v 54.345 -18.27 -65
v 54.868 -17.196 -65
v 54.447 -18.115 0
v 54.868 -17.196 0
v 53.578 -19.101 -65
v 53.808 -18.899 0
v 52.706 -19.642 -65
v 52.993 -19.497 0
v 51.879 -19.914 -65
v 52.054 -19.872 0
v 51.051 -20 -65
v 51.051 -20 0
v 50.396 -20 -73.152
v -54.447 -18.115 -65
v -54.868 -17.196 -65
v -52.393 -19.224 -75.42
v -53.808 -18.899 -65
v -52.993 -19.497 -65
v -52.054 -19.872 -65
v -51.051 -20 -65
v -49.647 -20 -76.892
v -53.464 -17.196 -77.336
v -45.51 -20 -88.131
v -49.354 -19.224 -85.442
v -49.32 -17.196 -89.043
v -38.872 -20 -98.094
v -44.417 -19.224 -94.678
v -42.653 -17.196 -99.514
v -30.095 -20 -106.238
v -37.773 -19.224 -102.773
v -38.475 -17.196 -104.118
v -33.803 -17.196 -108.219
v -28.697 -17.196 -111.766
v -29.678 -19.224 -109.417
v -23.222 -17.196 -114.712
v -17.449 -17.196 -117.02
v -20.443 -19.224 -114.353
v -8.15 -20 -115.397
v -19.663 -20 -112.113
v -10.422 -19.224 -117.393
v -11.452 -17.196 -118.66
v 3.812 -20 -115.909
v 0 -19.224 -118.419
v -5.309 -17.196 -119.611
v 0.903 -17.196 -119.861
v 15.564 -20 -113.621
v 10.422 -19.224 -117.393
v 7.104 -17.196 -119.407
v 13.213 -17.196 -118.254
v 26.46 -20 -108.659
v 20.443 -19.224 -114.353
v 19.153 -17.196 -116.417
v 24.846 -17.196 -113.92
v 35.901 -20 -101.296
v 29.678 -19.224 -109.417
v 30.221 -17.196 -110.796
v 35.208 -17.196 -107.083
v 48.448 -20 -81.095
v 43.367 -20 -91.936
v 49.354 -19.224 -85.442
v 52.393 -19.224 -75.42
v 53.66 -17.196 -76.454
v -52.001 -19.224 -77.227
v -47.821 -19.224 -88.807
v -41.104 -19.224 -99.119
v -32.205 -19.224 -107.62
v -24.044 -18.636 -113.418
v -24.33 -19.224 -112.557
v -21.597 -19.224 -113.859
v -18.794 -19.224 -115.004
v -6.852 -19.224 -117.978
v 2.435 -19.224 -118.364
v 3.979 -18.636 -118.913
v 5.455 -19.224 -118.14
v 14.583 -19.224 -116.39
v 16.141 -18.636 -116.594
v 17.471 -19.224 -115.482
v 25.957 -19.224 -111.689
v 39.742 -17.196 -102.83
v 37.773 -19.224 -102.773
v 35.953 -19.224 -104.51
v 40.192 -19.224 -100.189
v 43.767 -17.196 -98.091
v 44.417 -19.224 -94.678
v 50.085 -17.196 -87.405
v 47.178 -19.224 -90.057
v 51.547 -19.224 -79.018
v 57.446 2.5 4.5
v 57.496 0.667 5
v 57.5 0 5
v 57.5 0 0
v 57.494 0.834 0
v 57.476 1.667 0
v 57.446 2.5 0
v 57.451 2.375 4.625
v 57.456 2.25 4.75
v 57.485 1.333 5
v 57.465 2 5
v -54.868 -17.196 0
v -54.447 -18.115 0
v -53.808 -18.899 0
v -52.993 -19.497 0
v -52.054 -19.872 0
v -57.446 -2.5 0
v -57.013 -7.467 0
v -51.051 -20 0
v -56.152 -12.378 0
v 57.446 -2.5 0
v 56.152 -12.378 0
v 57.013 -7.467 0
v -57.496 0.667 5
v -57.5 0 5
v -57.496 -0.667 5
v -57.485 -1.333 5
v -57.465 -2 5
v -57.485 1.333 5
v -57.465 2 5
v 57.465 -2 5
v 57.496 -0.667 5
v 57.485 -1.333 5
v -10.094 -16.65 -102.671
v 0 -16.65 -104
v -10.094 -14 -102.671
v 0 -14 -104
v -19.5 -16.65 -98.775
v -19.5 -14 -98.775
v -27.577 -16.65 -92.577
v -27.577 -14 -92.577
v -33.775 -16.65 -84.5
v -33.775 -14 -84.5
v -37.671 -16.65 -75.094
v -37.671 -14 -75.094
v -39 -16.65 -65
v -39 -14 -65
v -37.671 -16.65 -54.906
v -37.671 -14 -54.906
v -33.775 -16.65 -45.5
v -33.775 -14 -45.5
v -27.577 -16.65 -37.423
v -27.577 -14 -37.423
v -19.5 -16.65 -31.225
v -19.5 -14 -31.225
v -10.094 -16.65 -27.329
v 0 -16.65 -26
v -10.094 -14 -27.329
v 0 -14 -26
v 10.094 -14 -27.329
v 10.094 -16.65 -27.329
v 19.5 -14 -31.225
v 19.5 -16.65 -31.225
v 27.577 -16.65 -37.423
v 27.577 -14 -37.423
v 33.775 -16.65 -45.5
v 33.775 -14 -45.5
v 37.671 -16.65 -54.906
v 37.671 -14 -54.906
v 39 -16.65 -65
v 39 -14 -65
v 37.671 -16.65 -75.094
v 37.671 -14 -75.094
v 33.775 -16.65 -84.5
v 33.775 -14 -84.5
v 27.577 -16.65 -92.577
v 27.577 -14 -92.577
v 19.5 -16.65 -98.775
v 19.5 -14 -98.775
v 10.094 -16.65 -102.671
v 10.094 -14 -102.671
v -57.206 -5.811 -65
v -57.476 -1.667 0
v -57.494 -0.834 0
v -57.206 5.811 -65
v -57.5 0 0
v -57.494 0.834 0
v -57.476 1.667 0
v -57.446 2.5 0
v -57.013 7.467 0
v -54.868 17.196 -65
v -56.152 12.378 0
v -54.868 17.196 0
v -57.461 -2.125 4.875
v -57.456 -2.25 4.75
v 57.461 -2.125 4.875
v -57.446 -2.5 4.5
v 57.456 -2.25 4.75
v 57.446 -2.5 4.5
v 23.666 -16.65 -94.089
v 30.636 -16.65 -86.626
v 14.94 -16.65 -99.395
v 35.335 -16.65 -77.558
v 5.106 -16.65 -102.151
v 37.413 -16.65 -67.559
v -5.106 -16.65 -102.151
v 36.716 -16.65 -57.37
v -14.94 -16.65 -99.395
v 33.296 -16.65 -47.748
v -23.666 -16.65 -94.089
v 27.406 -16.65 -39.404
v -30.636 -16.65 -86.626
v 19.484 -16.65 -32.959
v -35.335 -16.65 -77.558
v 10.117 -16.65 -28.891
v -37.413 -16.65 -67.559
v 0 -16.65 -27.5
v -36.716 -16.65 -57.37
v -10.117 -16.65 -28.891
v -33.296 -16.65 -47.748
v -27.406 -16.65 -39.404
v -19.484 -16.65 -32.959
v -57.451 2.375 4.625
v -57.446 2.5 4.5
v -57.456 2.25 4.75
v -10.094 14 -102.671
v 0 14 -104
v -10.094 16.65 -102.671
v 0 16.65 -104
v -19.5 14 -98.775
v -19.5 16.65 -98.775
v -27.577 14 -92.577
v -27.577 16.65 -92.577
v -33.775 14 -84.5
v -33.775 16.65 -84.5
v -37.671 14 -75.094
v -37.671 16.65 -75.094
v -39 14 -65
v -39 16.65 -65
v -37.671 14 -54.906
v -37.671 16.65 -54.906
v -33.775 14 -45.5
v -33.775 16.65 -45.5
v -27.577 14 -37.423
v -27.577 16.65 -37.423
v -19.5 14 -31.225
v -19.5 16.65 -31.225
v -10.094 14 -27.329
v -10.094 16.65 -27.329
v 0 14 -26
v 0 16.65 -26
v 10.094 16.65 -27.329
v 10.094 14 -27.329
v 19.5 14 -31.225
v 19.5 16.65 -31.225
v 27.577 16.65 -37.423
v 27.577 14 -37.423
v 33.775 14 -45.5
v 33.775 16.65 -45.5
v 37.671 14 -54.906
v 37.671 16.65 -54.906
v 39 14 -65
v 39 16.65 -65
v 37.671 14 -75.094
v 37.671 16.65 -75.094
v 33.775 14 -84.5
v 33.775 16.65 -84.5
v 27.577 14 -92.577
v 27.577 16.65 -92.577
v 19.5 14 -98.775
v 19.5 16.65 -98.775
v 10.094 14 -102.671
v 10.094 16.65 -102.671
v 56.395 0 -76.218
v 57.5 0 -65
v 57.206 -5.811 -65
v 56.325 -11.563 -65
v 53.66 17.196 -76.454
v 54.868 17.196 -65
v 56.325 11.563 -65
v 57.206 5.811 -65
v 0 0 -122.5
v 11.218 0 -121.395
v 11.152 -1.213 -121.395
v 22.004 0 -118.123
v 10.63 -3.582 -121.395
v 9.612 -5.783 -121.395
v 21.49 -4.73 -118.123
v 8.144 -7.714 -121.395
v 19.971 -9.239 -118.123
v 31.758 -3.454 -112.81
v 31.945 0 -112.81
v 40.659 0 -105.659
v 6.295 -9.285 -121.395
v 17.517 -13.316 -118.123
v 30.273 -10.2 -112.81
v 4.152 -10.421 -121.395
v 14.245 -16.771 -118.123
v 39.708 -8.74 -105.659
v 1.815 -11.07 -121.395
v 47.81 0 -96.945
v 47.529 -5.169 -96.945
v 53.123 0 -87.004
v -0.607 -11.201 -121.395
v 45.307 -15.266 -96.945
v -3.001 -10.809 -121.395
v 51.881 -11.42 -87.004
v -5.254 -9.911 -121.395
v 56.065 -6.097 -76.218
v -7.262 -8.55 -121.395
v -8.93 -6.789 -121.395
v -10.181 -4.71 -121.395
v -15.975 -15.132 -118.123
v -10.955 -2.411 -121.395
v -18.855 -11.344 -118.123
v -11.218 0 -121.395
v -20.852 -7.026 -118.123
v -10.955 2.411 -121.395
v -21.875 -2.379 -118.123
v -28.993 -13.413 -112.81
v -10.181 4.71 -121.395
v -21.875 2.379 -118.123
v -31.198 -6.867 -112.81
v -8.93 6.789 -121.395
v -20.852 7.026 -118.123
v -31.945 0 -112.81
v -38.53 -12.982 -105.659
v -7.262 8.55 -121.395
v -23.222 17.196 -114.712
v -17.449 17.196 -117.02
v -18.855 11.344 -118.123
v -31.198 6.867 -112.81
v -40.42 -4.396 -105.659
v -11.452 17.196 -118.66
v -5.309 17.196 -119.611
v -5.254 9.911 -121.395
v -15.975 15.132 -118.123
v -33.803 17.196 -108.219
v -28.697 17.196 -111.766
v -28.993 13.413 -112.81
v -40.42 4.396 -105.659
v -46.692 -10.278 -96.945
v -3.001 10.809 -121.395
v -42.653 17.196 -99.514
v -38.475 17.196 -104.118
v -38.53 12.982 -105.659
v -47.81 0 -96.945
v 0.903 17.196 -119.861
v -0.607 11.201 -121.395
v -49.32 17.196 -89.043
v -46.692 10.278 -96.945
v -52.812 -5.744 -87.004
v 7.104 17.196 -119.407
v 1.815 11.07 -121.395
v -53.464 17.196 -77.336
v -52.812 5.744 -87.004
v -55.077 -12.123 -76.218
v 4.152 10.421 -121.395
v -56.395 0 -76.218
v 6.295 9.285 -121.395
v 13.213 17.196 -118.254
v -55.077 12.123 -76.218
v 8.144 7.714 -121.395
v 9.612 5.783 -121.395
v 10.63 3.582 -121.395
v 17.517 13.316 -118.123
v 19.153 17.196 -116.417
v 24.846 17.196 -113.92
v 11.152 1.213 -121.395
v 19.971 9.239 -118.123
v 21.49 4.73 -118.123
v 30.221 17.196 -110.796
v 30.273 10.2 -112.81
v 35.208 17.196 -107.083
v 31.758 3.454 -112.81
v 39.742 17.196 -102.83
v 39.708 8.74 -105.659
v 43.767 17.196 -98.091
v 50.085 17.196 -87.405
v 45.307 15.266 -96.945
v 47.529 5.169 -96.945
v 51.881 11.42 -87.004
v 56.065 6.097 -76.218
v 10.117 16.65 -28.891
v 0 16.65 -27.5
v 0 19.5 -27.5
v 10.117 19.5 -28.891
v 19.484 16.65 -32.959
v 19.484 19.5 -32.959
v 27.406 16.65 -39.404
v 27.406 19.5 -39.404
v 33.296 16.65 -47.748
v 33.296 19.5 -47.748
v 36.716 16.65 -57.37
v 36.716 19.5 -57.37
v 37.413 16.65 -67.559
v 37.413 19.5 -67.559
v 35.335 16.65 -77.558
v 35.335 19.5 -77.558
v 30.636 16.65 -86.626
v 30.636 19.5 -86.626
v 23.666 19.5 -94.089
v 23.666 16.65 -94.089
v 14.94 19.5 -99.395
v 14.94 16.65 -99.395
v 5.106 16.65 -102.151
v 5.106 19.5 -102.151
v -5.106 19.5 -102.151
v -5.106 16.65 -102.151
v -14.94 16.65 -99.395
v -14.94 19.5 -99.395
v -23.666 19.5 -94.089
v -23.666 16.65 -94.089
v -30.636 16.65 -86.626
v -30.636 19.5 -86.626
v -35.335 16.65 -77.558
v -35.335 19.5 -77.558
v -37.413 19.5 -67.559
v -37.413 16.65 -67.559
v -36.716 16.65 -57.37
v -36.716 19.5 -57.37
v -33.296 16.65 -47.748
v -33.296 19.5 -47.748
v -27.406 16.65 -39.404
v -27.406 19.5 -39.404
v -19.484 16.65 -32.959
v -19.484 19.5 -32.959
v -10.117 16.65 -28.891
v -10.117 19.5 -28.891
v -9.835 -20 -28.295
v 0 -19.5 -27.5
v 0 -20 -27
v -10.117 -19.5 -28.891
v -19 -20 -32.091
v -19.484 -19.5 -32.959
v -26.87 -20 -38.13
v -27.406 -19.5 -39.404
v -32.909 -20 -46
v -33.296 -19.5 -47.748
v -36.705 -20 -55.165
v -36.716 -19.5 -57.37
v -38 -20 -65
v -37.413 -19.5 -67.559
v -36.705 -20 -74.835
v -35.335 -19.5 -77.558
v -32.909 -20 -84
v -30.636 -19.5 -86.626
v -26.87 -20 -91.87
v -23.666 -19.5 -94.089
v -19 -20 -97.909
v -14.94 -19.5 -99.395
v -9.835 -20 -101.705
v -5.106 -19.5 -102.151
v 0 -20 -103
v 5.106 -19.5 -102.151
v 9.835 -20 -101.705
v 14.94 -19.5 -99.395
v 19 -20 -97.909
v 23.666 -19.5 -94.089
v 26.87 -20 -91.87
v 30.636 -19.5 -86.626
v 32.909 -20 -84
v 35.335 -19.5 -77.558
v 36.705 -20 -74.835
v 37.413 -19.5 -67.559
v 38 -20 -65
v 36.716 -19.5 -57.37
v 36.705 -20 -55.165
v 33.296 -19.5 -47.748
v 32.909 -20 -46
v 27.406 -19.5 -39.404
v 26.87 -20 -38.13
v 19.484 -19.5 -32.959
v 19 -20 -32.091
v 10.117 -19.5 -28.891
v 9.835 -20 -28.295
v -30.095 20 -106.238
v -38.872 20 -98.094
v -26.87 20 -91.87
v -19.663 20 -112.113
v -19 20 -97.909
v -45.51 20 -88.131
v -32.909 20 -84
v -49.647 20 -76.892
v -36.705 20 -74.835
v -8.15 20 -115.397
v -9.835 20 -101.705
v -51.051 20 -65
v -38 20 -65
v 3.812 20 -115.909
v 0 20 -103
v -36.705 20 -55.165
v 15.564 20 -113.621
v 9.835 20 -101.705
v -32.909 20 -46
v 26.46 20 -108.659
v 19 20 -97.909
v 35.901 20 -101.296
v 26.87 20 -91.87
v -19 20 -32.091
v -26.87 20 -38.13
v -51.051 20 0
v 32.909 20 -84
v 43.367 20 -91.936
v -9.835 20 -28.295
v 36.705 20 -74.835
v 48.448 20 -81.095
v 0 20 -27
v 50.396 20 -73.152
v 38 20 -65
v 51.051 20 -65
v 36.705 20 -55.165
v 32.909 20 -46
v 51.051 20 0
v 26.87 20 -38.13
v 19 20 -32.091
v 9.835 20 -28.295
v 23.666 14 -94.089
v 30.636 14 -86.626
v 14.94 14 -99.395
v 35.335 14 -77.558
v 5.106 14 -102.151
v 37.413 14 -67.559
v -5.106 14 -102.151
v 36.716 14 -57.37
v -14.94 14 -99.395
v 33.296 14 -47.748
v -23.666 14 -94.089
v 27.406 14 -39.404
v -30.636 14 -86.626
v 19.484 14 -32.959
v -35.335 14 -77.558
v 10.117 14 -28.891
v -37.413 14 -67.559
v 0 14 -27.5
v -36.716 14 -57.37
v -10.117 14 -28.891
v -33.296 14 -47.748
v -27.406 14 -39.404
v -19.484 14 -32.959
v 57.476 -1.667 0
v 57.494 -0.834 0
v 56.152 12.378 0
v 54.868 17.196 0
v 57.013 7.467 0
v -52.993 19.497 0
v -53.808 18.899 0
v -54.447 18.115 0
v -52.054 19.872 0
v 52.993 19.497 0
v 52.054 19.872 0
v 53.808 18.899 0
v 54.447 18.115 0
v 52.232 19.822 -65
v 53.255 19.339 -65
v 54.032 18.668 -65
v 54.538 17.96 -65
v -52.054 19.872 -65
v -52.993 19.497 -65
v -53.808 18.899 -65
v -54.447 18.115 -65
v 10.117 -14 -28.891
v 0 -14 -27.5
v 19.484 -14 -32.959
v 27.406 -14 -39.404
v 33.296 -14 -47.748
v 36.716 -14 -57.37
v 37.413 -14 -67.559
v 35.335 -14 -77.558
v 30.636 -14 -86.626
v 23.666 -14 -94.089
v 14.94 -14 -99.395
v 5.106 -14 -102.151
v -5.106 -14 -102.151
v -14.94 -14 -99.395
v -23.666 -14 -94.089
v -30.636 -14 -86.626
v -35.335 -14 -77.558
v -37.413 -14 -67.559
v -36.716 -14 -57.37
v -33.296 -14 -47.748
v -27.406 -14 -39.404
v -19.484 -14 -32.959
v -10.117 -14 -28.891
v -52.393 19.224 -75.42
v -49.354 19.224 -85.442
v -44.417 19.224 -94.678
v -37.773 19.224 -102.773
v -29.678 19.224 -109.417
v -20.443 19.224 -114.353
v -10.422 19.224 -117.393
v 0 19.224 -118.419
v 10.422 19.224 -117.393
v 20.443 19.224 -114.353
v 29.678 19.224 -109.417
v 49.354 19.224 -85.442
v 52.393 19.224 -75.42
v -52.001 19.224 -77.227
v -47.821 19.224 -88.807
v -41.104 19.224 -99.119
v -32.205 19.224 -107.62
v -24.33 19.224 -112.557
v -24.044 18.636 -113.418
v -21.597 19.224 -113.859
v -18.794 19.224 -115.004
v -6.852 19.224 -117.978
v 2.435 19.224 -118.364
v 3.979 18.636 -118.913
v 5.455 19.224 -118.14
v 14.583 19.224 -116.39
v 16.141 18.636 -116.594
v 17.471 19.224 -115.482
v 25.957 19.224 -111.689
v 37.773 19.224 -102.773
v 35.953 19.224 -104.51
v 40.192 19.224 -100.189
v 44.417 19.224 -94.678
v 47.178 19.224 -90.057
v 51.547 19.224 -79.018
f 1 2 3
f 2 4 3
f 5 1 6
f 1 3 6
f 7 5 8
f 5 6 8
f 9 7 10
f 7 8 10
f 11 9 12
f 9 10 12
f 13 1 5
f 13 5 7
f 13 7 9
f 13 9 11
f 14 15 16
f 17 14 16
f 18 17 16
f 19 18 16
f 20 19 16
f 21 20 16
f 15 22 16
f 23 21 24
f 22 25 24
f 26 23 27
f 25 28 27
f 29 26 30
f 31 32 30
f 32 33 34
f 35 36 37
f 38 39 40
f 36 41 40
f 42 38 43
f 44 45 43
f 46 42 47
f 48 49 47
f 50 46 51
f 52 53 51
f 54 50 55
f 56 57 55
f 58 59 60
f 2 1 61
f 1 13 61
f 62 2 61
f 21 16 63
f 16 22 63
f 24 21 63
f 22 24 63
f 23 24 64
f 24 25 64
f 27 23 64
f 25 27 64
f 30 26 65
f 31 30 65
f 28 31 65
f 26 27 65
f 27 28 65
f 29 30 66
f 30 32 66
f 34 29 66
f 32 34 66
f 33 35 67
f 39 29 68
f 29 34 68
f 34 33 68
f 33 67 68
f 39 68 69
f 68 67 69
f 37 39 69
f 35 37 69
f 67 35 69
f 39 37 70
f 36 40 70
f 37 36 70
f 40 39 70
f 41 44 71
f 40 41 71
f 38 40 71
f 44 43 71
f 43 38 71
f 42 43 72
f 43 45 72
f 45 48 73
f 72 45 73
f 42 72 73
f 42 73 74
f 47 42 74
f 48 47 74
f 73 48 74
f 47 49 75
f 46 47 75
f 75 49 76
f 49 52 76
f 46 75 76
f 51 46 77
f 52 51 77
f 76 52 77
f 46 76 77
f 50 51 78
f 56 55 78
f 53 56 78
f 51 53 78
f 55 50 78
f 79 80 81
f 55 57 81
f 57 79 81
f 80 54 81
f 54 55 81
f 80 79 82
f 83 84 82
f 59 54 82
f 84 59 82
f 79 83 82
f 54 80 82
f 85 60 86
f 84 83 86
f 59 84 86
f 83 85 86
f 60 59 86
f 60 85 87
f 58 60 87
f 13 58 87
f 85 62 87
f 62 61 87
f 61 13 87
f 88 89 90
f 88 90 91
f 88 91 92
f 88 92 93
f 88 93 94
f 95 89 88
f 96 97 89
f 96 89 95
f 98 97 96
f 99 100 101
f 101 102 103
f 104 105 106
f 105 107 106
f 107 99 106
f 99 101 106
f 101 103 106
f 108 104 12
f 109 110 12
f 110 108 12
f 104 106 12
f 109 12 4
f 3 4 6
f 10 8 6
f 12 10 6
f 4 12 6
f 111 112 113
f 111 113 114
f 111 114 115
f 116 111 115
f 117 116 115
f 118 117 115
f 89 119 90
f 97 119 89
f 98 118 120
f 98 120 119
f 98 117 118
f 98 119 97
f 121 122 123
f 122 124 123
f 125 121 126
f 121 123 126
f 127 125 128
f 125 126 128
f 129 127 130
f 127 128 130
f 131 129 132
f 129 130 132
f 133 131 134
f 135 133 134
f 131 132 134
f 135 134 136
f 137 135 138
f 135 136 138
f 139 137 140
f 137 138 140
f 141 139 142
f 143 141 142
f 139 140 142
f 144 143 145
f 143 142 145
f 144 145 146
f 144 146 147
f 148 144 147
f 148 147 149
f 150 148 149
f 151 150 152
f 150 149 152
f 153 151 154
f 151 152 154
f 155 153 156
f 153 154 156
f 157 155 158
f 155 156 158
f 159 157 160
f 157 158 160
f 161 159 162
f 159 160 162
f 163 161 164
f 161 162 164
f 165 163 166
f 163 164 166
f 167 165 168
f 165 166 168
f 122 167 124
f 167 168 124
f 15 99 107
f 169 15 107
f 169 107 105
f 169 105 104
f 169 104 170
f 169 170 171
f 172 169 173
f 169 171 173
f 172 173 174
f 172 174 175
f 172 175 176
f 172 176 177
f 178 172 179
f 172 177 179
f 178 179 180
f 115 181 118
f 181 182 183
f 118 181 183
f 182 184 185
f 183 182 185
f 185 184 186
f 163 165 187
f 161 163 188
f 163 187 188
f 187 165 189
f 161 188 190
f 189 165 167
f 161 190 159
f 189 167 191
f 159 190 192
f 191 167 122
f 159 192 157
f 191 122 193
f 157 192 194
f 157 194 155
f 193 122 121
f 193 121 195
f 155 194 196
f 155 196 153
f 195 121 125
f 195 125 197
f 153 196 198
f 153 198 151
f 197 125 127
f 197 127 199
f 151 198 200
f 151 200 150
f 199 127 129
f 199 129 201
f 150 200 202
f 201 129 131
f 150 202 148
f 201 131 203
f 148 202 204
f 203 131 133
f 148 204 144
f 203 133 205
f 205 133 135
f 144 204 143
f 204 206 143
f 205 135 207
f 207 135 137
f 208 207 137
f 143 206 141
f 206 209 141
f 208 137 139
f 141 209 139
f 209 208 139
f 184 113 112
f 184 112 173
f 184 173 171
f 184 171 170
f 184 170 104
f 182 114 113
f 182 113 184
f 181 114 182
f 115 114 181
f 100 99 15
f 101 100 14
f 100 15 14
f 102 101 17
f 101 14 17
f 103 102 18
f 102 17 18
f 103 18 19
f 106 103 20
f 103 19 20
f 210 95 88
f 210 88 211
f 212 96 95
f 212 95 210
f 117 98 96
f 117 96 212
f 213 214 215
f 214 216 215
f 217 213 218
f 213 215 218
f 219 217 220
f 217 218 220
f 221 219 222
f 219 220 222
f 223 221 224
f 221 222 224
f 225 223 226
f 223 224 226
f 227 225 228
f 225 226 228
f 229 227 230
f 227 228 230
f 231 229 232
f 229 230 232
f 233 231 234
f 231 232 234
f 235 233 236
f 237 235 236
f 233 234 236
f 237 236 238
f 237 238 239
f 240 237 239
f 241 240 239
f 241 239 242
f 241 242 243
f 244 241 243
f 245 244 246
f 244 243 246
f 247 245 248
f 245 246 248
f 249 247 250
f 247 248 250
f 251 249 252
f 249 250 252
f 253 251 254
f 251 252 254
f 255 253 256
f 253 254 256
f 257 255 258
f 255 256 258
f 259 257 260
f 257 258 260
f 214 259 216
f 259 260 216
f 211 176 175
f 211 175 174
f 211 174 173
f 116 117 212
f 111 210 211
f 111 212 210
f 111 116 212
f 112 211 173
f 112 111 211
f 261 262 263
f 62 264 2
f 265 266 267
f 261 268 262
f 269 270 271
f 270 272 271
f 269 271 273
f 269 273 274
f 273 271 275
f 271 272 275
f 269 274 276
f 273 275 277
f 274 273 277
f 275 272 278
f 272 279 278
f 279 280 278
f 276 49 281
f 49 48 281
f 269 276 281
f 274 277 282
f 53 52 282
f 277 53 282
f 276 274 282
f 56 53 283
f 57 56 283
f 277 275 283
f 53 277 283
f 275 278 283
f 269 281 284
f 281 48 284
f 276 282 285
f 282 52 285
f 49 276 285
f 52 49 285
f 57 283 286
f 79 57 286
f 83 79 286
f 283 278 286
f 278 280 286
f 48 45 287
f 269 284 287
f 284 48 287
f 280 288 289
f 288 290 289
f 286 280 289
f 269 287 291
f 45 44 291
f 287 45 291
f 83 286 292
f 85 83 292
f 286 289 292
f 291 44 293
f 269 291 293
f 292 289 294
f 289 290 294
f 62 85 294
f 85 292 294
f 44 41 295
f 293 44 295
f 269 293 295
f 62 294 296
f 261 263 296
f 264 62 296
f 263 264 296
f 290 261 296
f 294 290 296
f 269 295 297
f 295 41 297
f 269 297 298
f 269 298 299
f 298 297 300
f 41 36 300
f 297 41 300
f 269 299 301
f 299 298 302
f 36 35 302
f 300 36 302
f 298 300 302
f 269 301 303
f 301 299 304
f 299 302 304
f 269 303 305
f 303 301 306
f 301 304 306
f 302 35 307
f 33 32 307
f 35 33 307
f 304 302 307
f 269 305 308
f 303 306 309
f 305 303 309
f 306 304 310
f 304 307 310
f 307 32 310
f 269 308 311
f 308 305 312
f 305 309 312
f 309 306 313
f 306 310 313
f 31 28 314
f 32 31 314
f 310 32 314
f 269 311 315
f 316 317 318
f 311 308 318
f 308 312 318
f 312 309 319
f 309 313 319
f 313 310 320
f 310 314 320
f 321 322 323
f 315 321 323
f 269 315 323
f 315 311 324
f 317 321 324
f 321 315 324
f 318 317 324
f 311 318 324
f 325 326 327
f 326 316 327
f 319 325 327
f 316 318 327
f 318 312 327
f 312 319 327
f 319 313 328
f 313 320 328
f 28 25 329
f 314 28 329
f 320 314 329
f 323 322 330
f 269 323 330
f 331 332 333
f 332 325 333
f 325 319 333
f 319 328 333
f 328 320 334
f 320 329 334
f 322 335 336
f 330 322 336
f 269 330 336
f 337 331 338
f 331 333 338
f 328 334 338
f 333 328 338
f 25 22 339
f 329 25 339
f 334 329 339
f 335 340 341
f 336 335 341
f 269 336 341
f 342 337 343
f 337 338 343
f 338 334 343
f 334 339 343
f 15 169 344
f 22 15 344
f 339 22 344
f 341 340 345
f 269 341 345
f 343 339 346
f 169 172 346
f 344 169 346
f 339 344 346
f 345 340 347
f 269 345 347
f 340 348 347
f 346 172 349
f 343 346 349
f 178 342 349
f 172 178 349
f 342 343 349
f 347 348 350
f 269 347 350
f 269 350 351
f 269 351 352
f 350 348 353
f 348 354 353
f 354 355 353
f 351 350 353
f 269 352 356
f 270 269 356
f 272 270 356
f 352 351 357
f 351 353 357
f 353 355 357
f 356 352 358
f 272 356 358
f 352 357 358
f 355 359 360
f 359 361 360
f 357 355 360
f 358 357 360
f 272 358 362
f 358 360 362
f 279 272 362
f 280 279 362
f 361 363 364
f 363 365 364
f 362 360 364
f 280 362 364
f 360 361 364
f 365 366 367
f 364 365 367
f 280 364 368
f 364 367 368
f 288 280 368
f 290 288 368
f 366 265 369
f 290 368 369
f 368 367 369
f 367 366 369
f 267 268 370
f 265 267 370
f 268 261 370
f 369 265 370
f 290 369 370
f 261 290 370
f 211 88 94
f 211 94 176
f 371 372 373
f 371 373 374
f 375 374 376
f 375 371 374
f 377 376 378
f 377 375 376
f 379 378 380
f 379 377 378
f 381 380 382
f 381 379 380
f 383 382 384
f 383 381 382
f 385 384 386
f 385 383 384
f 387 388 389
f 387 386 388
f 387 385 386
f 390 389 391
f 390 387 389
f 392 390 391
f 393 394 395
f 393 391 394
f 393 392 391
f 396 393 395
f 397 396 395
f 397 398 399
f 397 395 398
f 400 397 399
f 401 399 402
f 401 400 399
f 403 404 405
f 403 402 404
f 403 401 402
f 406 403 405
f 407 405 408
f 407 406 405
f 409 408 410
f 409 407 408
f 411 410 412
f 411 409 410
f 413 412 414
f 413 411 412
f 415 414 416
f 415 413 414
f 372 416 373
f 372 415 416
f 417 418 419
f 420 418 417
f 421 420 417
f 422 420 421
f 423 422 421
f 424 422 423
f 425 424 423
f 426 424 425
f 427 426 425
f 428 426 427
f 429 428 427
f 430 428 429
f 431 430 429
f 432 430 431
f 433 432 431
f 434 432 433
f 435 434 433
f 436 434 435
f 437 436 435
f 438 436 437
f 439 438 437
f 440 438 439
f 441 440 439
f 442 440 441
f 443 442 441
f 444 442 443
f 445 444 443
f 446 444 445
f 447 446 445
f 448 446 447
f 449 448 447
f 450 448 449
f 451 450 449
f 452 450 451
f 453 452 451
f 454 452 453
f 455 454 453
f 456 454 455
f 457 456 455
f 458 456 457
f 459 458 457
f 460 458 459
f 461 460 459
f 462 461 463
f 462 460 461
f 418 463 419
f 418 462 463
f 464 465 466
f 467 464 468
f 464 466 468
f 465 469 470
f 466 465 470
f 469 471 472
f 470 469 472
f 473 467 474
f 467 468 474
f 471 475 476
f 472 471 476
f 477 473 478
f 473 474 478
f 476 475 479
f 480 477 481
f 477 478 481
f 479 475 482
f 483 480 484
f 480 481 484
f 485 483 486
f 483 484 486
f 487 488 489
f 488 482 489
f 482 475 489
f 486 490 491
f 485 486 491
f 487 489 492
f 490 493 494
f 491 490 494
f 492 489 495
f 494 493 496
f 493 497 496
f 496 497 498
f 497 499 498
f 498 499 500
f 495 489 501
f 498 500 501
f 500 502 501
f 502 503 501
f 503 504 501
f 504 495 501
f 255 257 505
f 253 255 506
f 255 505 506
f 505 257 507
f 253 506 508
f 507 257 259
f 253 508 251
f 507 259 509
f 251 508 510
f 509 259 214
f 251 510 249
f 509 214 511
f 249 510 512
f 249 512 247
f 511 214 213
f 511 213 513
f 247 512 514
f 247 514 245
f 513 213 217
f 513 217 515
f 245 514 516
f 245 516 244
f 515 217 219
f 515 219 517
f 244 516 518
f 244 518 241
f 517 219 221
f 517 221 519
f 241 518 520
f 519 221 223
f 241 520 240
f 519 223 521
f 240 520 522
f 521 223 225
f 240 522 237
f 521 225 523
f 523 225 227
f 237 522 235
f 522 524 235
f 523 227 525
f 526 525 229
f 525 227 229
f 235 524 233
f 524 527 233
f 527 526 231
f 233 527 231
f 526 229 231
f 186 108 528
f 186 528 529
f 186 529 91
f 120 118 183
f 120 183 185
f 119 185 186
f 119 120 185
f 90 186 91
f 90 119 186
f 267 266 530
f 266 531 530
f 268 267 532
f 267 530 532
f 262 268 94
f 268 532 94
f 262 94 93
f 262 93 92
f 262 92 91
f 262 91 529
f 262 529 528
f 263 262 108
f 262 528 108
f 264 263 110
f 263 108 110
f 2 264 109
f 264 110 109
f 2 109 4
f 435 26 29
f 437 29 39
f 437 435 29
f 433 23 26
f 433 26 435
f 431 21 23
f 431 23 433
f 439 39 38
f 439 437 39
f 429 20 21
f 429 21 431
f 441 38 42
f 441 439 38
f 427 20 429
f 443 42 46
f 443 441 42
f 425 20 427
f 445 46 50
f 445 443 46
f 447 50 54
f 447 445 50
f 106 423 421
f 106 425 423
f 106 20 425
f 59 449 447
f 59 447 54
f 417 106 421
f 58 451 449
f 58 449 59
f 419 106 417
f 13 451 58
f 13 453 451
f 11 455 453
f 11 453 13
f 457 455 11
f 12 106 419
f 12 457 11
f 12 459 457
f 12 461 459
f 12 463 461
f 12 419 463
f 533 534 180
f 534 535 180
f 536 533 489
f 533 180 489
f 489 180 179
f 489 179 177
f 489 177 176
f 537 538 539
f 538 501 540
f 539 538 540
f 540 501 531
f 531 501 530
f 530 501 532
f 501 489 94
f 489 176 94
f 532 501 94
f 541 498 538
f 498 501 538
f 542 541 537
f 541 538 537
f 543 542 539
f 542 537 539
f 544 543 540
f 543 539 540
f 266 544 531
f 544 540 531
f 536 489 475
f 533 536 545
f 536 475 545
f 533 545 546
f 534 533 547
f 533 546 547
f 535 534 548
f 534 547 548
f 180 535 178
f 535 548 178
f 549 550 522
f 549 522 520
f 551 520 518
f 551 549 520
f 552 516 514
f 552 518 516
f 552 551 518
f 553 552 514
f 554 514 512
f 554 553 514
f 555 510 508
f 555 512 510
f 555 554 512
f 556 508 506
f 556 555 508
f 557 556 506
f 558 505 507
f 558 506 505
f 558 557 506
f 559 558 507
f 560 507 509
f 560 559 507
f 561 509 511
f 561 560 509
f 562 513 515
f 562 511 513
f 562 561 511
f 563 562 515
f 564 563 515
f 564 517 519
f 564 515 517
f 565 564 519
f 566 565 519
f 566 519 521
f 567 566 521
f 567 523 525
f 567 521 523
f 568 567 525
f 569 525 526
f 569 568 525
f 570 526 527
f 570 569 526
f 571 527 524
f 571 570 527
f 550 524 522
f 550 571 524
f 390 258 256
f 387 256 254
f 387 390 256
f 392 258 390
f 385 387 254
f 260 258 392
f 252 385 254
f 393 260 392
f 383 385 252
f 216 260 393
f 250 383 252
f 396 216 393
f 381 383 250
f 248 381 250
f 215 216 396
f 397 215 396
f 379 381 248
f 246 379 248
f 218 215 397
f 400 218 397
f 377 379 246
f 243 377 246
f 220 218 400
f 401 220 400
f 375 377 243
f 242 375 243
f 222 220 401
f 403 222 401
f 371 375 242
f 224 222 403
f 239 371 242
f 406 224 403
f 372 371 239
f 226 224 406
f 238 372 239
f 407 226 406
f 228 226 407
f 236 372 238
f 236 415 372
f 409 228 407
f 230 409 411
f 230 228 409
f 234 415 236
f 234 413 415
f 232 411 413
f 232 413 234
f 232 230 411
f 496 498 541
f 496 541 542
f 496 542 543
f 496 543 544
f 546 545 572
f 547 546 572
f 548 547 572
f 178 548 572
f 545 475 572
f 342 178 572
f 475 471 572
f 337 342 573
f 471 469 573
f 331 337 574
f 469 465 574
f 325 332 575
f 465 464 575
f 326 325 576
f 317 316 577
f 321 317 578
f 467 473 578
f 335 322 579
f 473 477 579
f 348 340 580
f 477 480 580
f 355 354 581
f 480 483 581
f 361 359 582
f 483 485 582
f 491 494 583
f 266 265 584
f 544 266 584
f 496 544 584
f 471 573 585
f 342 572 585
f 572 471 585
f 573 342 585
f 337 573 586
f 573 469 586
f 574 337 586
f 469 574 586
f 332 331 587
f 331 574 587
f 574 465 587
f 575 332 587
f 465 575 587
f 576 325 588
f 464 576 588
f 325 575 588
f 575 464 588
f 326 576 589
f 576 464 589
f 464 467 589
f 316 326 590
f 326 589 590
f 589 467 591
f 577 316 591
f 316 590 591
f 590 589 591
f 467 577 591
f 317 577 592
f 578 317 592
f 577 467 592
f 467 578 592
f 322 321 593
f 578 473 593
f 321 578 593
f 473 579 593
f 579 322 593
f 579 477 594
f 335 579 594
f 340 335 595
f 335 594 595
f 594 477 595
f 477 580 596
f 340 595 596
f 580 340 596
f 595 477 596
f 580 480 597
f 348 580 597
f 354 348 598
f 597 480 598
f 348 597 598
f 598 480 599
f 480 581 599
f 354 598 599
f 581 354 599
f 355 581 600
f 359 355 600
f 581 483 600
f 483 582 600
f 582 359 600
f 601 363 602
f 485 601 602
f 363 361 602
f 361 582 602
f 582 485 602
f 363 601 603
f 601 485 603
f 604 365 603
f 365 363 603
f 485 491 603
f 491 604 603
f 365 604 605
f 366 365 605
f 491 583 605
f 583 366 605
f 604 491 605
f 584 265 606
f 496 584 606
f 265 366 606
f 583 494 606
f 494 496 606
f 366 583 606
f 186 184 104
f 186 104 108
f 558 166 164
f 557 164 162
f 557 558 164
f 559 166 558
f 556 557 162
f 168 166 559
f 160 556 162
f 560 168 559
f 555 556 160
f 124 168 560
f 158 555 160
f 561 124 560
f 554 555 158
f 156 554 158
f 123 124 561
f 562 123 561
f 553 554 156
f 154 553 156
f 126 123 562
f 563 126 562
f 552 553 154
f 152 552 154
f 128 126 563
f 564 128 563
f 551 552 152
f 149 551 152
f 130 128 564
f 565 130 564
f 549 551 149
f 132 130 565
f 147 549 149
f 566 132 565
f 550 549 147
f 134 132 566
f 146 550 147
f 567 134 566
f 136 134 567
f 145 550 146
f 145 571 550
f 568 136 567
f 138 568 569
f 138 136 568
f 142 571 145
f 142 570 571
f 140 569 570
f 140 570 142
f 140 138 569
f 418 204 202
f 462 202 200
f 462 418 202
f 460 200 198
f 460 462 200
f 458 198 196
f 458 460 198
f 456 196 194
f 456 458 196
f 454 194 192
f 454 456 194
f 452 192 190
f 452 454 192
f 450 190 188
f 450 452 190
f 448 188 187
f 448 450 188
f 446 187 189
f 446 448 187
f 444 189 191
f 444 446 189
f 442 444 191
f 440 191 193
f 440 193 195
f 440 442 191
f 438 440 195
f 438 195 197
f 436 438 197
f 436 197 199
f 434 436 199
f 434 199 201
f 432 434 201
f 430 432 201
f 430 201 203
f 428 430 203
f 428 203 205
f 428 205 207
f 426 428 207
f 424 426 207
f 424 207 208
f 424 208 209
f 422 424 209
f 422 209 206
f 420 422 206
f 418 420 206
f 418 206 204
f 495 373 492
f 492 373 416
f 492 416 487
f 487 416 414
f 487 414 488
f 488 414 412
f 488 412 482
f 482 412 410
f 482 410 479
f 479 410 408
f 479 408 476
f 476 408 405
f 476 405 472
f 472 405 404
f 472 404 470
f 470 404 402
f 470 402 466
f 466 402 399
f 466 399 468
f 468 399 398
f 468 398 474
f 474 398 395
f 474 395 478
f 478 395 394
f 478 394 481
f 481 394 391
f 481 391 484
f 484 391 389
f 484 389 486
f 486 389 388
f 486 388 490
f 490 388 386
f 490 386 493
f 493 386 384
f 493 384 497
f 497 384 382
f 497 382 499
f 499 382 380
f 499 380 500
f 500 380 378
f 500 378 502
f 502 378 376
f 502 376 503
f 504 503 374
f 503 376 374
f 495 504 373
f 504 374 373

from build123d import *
from build123d.topology import SkipClean

# Parameters (mm, degrees)
SKETCH2_OUTSIDE_W       = 157.722
SKETCH2_OUTSIDE_H       = 157.722
SKETCH2_OUTSIDE_W_2     = 115
SKETCH2_OUTSIDE_H_2     = 40
CUT_EXTRUDE1_DEPTH      = 148.033159525
CUT_EXTRUDE2_DEPTH      = 137.793640203
CUT_EXTRUDE2_DEPTH_BACK = 137.793640203
SKETCH1_4_R             = 37.5
FILLET1_R               = 4
SKETCH3_W               = 1.5
SKETCH3_H               = 2.65
BOSS_EXTRUDE1_DEPTH     = 5
CHAMFER1_SIZE           = 0.5


with BuildPart() as part:
    # Sketch1 → Revolve1 (revolve)
    with BuildSketch(Plane(origin=(0, 0, 0), x_dir=(1, 0, 0), z_dir=(0, 1, 0))):
        with BuildLine():
            Line((57.5, 0), (57.5, 65))
            ThreePointArc((57.5, 65), (40.658639918, 105.658639918), (0, 122.5))
            Line((0, 122.5), (0, 0))
            Line((0, 0), (57.5, 0))
        make_face()
    revolve(axis=Axis((0, 0, 0), (0, 0, -1)))

    # Sketch2 outside → Cut-Extrude1 (cut, through all)
    with BuildSketch(Plane.XY):
        Rectangle(SKETCH2_OUTSIDE_W, SKETCH2_OUTSIDE_H)
        Rectangle(SKETCH2_OUTSIDE_W_2, SKETCH2_OUTSIDE_H_2, mode=Mode.SUBTRACT)
    extrude(amount=-CUT_EXTRUDE1_DEPTH, mode=Mode.SUBTRACT)

    # Sketch1<4> → Cut-Extrude2 (cut, two sides: drawn at the far end of the back side and taken through both)
    with BuildSketch(Plane(origin=(0, 0, 0), x_dir=(1, 0, 0), z_dir=(0, 1, 0)).offset(-CUT_EXTRUDE2_DEPTH_BACK)):
        with Locations((0, 65)):
            Circle(SKETCH1_4_R)
    extrude(amount=CUT_EXTRUDE2_DEPTH + CUT_EXTRUDE2_DEPTH_BACK, mode=Mode.SUBTRACT)

    # Fillet1
    fillet1_edges = [part.edges().sort_by_distance(p)[0] for p in [
        (-53.909646632, -20, -32.5),
        (0, -20, -118.909646632),
        (-53.909646632, 20, -32.5),
        (0, 20, -118.909646632),
        (53.909646632, -20, -32.5),
        (53.909646632, 20, -32.5),
    ]]
    fillet(fillet1_edges, radius=FILLET1_R)

    # Sketch3 → Cut-Revolve1 (revolve, cut)
    with BuildSketch(Plane(origin=(0, 0, 0), x_dir=(0, 0, -1), z_dir=(1, 0, 0))):
        with Locations((103.25, 15.325)):
            Rectangle(SKETCH3_W, SKETCH3_H)
        with Locations((103.25, -15.325)):
            Rectangle(SKETCH3_W, SKETCH3_H)
    revolve(axis=Axis((0, -20, -65), (0, 1, 0)), mode=Mode.SUBTRACT)

    # Sketch4 → Boss-Extrude1 (add)
    with SkipClean():  # the faces are left unmerged after this step: merging them gives an invalid solid
        with BuildSketch(Plane.XY):
            with BuildLine():
                Line((-57.445626465, -2.5), (57.445626465, -2.5))
                ThreePointArc((57.445626465, -2.5), (57.486405007, -1.250295697), (57.5, -1.68e-07))
                ThreePointArc((57.5, -1.68e-07), (57.486405011, 1.250295529), (57.445626465, 2.5))
                Line((57.445626465, 2.5), (-57.445626465, 2.5))
                ThreePointArc((-57.445626465, 2.5), (-57.486405007, 1.250295697), (-57.5, 1.68e-07))
                ThreePointArc((-57.5, 1.68e-07), (-57.486405011, -1.250295529), (-57.445626465, -2.5))
            make_face()
        extrude(amount=BOSS_EXTRUDE1_DEPTH)

    # Chamfer1
    chamfer1_edges = [part.edges().sort_by_distance(p)[0] for p in [
        (0, -2.5, 5),
        (0, 2.5, 5),
        (-37.5, -20, -65),
        (-37.5, 20, -65),
    ]]
    chamfer(chamfer1_edges, length=CHAMFER1_SIZE)


solid = part.part
